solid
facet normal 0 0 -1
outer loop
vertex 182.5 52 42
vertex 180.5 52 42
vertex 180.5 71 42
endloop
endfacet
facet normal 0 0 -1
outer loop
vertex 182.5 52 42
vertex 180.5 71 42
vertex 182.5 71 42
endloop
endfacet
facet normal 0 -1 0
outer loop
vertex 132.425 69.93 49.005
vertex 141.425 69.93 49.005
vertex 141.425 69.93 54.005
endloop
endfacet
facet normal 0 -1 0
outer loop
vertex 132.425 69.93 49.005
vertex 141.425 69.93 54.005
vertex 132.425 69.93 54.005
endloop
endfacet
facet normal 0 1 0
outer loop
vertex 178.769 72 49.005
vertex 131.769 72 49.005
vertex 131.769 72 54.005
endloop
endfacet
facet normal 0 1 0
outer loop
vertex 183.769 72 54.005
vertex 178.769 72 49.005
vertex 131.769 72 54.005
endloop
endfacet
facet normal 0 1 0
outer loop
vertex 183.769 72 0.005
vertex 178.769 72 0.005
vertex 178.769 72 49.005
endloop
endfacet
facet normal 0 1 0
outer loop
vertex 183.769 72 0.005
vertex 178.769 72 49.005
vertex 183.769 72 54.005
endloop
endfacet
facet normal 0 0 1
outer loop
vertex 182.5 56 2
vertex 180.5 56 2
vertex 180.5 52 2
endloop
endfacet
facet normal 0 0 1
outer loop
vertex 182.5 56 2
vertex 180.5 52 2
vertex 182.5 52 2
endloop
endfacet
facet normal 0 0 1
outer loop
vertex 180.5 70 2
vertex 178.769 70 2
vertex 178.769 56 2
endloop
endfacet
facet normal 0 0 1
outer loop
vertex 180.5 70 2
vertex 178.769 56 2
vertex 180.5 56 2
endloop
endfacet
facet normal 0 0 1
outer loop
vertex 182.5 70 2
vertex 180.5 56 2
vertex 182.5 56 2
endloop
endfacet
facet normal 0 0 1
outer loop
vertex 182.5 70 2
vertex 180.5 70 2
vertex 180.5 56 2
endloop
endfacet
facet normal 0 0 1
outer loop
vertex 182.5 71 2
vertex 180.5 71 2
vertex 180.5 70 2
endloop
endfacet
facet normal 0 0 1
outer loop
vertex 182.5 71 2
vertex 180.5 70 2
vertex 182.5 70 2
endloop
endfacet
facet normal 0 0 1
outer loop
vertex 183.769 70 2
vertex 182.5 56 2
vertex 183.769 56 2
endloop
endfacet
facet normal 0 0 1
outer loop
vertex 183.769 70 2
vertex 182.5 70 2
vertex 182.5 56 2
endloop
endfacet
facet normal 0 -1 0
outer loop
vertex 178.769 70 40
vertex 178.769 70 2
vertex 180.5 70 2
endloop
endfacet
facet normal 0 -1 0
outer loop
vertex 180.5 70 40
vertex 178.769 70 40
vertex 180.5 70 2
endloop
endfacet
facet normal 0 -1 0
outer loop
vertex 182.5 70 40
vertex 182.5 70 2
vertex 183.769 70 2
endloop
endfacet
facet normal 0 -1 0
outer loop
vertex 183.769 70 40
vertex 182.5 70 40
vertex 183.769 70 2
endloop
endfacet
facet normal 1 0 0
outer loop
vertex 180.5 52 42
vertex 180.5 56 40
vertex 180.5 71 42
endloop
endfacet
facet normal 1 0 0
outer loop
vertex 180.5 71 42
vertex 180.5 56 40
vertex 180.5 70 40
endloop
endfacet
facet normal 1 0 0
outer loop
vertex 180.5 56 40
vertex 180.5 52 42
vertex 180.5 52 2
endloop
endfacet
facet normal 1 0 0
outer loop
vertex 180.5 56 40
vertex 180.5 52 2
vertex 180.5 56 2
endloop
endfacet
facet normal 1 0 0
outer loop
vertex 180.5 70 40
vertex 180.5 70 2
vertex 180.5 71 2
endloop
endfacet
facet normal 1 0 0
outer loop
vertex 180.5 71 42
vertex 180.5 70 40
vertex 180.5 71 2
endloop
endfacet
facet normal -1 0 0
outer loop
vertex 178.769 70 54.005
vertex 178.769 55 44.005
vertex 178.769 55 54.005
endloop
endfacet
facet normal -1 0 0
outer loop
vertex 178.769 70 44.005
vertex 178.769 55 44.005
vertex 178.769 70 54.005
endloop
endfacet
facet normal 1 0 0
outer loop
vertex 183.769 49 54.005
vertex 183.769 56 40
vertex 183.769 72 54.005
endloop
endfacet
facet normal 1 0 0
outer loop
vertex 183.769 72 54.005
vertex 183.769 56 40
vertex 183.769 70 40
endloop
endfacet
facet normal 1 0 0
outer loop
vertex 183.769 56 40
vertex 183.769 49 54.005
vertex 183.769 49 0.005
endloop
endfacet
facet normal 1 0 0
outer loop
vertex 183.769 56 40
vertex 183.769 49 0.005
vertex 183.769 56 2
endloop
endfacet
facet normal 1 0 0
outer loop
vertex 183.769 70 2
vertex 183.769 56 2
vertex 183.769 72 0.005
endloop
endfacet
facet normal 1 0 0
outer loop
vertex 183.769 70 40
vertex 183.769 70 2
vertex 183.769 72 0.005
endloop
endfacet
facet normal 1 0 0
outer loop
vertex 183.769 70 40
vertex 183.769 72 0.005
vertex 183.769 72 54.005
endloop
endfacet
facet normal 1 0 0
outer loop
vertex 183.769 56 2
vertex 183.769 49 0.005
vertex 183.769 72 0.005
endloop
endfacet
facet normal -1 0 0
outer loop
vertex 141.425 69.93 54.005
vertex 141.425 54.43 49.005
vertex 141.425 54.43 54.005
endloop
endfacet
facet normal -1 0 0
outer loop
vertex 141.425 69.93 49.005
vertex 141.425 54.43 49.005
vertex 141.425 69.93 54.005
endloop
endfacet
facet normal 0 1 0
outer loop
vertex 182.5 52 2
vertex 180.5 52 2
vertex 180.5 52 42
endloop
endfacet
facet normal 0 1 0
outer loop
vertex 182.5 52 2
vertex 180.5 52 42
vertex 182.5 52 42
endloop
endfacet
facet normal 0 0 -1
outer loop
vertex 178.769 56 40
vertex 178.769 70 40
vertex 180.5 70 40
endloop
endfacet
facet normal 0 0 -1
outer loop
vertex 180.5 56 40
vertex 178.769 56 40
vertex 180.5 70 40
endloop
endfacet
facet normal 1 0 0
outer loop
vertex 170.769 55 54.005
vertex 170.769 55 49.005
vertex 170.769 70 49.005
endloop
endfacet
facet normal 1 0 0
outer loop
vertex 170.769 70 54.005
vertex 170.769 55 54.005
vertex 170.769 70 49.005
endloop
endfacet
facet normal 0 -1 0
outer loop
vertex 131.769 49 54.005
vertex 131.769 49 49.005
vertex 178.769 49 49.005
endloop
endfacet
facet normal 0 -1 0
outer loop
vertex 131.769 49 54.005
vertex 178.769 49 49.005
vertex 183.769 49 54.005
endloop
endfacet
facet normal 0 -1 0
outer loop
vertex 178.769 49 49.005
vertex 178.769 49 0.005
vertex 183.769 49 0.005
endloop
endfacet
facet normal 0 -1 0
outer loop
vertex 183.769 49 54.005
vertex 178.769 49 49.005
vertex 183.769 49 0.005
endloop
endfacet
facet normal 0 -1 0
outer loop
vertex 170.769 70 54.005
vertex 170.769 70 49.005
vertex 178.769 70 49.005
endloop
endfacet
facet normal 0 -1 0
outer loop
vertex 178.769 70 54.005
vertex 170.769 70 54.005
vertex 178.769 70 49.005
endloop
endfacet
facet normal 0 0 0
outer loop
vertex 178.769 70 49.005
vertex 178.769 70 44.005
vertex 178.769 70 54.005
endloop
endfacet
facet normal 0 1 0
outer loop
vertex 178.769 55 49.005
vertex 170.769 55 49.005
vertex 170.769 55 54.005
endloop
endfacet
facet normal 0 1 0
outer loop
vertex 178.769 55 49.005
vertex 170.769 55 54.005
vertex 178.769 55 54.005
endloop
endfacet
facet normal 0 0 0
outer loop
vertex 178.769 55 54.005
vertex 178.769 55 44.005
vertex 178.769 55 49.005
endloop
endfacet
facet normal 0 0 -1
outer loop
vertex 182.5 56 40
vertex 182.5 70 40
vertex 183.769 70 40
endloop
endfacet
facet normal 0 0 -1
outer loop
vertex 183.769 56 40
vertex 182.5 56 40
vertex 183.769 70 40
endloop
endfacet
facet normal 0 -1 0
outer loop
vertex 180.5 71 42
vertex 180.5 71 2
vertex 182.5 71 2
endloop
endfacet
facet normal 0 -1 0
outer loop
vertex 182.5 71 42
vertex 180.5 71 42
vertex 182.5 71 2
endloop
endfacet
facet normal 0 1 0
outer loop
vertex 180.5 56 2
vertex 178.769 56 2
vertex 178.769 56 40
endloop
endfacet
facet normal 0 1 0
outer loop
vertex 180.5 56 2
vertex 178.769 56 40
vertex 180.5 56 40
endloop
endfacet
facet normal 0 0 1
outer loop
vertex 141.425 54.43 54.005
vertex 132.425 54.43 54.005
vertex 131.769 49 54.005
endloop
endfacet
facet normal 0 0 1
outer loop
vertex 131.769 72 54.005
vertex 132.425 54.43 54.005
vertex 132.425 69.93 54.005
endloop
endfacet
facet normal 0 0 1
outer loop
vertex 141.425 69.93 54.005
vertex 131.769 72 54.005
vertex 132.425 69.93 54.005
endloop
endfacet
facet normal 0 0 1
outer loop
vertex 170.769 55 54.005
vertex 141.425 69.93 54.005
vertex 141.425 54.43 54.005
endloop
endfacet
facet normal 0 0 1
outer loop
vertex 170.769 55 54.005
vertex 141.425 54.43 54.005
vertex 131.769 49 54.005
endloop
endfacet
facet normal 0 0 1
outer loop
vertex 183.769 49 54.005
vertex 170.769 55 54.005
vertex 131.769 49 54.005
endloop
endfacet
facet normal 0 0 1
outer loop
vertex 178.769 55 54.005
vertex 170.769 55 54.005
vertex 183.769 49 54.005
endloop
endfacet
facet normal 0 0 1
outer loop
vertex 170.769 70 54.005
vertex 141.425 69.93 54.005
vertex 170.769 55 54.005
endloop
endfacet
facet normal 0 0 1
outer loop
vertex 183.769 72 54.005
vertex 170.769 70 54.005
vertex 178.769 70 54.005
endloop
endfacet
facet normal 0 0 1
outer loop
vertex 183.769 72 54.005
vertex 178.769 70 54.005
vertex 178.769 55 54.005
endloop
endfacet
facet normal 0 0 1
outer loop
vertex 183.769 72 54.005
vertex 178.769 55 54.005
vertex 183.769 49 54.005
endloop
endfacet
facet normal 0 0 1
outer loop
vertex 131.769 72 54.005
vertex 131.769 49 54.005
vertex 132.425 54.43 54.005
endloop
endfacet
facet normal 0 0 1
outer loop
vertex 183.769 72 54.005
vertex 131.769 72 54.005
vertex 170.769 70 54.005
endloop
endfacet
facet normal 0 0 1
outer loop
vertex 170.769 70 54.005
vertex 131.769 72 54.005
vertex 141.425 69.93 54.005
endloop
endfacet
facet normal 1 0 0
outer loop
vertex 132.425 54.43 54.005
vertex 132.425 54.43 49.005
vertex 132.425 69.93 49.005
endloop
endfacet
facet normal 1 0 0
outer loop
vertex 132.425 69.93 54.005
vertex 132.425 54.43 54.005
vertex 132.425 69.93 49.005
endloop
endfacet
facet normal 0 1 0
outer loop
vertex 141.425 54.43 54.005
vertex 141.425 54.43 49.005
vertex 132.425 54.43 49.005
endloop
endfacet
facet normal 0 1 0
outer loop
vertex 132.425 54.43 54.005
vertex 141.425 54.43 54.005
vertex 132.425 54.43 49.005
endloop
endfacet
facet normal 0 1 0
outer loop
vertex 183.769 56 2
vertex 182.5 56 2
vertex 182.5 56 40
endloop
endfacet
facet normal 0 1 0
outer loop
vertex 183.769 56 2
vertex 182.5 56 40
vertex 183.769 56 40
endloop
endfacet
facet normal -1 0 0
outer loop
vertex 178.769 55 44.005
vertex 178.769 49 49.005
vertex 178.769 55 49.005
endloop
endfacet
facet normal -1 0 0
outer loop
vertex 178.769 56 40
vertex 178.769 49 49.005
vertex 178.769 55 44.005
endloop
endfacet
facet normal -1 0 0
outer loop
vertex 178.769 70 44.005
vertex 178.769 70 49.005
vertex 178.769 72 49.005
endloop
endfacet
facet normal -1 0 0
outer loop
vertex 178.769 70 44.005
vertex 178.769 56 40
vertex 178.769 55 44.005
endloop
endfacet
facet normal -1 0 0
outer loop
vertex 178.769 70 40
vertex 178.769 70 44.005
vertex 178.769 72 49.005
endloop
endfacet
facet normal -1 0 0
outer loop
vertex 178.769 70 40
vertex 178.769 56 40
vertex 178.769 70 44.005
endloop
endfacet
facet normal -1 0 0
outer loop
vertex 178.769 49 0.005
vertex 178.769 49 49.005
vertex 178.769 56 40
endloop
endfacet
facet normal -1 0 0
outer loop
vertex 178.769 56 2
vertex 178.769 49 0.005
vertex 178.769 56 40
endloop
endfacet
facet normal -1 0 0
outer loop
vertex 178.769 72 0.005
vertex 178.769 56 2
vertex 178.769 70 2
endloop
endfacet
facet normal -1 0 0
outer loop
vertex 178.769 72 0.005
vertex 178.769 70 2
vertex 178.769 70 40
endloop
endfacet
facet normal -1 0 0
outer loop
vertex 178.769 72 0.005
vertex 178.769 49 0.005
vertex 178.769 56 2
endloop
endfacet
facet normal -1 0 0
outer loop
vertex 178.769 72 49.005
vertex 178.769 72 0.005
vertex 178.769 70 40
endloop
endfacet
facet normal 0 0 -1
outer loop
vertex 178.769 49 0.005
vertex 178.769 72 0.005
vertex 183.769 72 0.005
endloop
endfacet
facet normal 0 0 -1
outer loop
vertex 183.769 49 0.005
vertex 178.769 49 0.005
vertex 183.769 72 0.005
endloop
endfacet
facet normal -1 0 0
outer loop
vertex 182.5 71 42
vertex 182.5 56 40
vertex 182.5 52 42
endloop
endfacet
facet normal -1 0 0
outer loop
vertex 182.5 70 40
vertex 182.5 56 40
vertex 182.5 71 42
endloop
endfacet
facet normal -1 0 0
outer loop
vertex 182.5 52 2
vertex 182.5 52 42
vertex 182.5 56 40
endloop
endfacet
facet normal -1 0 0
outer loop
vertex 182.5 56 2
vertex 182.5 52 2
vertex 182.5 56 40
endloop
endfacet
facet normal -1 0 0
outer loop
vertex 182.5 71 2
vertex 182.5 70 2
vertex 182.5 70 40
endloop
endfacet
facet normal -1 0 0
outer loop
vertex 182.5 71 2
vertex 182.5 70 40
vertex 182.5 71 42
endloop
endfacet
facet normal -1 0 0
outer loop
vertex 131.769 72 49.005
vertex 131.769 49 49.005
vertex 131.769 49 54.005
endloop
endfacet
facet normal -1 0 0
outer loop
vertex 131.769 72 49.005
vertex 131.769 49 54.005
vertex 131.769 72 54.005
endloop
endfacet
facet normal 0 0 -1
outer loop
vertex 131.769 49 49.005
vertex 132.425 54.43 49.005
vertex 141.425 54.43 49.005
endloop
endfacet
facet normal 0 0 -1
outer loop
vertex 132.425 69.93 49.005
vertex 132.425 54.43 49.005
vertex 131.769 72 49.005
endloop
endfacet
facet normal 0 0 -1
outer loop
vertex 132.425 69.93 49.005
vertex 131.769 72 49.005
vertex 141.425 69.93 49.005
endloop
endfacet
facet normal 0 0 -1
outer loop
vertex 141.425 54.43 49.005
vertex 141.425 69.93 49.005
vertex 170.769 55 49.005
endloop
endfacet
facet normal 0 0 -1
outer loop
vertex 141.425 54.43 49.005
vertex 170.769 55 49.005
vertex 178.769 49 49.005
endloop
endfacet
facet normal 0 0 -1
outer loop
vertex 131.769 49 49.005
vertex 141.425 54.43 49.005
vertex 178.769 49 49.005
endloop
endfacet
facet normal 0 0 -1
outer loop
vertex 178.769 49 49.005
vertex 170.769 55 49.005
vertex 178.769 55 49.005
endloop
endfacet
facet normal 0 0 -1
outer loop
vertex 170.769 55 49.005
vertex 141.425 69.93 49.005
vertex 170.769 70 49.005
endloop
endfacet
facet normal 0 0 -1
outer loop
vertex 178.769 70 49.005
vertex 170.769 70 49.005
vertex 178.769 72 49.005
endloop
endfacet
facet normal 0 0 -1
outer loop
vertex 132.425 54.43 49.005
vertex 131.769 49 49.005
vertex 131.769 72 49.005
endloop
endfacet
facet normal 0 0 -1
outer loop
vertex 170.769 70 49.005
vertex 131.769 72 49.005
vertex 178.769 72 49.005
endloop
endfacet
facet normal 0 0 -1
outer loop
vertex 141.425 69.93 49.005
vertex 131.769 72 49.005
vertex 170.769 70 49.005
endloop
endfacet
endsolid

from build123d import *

# Parameters (mm, degrees)
SKETCH040_W                = 15.5
SKETCH040_H                = 9
EXTRUDE038_DEPTH           = 6
EXTRUDE038_PLACEMENT_ANGLE = 90
BOX069_W                   = 8
BOX069_H                   = 15
BOX069_DEPTH               = 15
BOX063_W                   = 2
BOX063_H                   = 14
BOX063_DEPTH               = 37
BOX048_W                   = 2
BOX048_H                   = 19
BOX048_DEPTH               = 40
BOX064_W                   = 8
BOX064_H                   = 14
BOX064_DEPTH               = 38
BOX047_W                   = 5
BOX047_H                   = 23
BOX047_DEPTH               = 49
BOX046_W                   = 52
BOX046_H                   = 23
BOX046_DEPTH               = 5


with BuildPart() as tab001:
    # Sketch040 → Extrude038 (new body)
    with BuildSketch(Plane.XY):
        with Locations((3.19859, 5.867378)):
            Rectangle(SKETCH040_W, SKETCH040_H)
    extrude(amount=EXTRUDE038_DEPTH)


with BuildPart() as tab001_1:
    # Extrude038 placement: moved
    add(tab001.part.moved(Location((142.792, 58.9812, 48.0053))).rotate(Axis((142.792, 58.9812, 48.0053), (0, 0, 1)), EXTRUDE038_PLACEMENT_ANGLE))


with BuildPart() as cables_cut_encoder_piece:
    # Box069 → Box069 (new body)
    with BuildSketch(Plane(origin=(170.769, 55, 44.0053), x_dir=(1, 0, 0), z_dir=(0, 0, 1))):
        with Locations((4, 7.5)):
            Rectangle(BOX069_W, BOX069_H)
    extrude(amount=BOX069_DEPTH)


with BuildPart() as cube016:
    # Box063 → Box063 (new body)
    with BuildSketch(Plane(origin=(201.5, 41, 3), x_dir=(1, 0, 0), z_dir=(0, 0, 1))):
        with Locations((1, 7)):
            Rectangle(BOX063_W, BOX063_H)
    extrude(amount=BOX063_DEPTH)


with BuildPart() as cube010:
    # Box048 → Box048 (new body)
    with BuildSketch(Plane(origin=(203.5, 37, 2), x_dir=(1, 0, 0), z_dir=(0, 0, 1))):
        with Locations((1, 9.5)):
            Rectangle(BOX048_W, BOX048_H)
    extrude(amount=BOX048_DEPTH)


with BuildPart() as encoder_support_slider:
    # Box064 → Box064 (new body)
    with BuildSketch(Plane(origin=(200.5, 41, 2), x_dir=(1, 0, 0), z_dir=(0, 0, 1))):
        with Locations((4, 7)):
            Rectangle(BOX064_W, BOX064_H)
    extrude(amount=BOX064_DEPTH)

    # Fusion125: union Cube016, Cube010
    add(cube016.part)
    add(cube010.part)


with BuildPart() as cube009:
    # Box047 → Box047 (new body)
    with BuildSketch(Plane(origin=(201.768682, 38, 0.005261), x_dir=(1, 0, 0), z_dir=(0, 0, 1))):
        with Locations((2.5, 11.5)):
            Rectangle(BOX047_W, BOX047_H)
    extrude(amount=BOX047_DEPTH)


with BuildPart() as encoder_support_with_tab:
    # Box046 → Box046 (new body)
    with BuildSketch(Plane(origin=(154.768682, 38, 49.005261), x_dir=(1, 0, 0), z_dir=(0, 0, 1))):
        with Locations((26, 11.5)):
            Rectangle(BOX046_W, BOX046_H)
    extrude(amount=BOX046_DEPTH)

    # Fusion094: union Cube009
    add(cube009.part)


with BuildPart() as encoder_support_with_tab_1:
    # Fusion094 placement: moved
    add(encoder_support_with_tab.part.moved(Location((0, -4, 0))))

    # Cut073: cut Encoder support slider
    add(encoder_support_slider.part, mode=Mode.SUBTRACT)


with BuildPart() as encoder_support_with_tab_2:
    # Cut073 placement: moved
    add(encoder_support_with_tab_1.part.moved(Location((-23, 15, 0))))

    # Cut076: cut Cables cut encoder piece
    add(cables_cut_encoder_piece.part, mode=Mode.SUBTRACT)

    # Cut077: cut Tab001
    add(tab001_1.part, mode=Mode.SUBTRACT)


solid = encoder_support_with_tab_2.part
